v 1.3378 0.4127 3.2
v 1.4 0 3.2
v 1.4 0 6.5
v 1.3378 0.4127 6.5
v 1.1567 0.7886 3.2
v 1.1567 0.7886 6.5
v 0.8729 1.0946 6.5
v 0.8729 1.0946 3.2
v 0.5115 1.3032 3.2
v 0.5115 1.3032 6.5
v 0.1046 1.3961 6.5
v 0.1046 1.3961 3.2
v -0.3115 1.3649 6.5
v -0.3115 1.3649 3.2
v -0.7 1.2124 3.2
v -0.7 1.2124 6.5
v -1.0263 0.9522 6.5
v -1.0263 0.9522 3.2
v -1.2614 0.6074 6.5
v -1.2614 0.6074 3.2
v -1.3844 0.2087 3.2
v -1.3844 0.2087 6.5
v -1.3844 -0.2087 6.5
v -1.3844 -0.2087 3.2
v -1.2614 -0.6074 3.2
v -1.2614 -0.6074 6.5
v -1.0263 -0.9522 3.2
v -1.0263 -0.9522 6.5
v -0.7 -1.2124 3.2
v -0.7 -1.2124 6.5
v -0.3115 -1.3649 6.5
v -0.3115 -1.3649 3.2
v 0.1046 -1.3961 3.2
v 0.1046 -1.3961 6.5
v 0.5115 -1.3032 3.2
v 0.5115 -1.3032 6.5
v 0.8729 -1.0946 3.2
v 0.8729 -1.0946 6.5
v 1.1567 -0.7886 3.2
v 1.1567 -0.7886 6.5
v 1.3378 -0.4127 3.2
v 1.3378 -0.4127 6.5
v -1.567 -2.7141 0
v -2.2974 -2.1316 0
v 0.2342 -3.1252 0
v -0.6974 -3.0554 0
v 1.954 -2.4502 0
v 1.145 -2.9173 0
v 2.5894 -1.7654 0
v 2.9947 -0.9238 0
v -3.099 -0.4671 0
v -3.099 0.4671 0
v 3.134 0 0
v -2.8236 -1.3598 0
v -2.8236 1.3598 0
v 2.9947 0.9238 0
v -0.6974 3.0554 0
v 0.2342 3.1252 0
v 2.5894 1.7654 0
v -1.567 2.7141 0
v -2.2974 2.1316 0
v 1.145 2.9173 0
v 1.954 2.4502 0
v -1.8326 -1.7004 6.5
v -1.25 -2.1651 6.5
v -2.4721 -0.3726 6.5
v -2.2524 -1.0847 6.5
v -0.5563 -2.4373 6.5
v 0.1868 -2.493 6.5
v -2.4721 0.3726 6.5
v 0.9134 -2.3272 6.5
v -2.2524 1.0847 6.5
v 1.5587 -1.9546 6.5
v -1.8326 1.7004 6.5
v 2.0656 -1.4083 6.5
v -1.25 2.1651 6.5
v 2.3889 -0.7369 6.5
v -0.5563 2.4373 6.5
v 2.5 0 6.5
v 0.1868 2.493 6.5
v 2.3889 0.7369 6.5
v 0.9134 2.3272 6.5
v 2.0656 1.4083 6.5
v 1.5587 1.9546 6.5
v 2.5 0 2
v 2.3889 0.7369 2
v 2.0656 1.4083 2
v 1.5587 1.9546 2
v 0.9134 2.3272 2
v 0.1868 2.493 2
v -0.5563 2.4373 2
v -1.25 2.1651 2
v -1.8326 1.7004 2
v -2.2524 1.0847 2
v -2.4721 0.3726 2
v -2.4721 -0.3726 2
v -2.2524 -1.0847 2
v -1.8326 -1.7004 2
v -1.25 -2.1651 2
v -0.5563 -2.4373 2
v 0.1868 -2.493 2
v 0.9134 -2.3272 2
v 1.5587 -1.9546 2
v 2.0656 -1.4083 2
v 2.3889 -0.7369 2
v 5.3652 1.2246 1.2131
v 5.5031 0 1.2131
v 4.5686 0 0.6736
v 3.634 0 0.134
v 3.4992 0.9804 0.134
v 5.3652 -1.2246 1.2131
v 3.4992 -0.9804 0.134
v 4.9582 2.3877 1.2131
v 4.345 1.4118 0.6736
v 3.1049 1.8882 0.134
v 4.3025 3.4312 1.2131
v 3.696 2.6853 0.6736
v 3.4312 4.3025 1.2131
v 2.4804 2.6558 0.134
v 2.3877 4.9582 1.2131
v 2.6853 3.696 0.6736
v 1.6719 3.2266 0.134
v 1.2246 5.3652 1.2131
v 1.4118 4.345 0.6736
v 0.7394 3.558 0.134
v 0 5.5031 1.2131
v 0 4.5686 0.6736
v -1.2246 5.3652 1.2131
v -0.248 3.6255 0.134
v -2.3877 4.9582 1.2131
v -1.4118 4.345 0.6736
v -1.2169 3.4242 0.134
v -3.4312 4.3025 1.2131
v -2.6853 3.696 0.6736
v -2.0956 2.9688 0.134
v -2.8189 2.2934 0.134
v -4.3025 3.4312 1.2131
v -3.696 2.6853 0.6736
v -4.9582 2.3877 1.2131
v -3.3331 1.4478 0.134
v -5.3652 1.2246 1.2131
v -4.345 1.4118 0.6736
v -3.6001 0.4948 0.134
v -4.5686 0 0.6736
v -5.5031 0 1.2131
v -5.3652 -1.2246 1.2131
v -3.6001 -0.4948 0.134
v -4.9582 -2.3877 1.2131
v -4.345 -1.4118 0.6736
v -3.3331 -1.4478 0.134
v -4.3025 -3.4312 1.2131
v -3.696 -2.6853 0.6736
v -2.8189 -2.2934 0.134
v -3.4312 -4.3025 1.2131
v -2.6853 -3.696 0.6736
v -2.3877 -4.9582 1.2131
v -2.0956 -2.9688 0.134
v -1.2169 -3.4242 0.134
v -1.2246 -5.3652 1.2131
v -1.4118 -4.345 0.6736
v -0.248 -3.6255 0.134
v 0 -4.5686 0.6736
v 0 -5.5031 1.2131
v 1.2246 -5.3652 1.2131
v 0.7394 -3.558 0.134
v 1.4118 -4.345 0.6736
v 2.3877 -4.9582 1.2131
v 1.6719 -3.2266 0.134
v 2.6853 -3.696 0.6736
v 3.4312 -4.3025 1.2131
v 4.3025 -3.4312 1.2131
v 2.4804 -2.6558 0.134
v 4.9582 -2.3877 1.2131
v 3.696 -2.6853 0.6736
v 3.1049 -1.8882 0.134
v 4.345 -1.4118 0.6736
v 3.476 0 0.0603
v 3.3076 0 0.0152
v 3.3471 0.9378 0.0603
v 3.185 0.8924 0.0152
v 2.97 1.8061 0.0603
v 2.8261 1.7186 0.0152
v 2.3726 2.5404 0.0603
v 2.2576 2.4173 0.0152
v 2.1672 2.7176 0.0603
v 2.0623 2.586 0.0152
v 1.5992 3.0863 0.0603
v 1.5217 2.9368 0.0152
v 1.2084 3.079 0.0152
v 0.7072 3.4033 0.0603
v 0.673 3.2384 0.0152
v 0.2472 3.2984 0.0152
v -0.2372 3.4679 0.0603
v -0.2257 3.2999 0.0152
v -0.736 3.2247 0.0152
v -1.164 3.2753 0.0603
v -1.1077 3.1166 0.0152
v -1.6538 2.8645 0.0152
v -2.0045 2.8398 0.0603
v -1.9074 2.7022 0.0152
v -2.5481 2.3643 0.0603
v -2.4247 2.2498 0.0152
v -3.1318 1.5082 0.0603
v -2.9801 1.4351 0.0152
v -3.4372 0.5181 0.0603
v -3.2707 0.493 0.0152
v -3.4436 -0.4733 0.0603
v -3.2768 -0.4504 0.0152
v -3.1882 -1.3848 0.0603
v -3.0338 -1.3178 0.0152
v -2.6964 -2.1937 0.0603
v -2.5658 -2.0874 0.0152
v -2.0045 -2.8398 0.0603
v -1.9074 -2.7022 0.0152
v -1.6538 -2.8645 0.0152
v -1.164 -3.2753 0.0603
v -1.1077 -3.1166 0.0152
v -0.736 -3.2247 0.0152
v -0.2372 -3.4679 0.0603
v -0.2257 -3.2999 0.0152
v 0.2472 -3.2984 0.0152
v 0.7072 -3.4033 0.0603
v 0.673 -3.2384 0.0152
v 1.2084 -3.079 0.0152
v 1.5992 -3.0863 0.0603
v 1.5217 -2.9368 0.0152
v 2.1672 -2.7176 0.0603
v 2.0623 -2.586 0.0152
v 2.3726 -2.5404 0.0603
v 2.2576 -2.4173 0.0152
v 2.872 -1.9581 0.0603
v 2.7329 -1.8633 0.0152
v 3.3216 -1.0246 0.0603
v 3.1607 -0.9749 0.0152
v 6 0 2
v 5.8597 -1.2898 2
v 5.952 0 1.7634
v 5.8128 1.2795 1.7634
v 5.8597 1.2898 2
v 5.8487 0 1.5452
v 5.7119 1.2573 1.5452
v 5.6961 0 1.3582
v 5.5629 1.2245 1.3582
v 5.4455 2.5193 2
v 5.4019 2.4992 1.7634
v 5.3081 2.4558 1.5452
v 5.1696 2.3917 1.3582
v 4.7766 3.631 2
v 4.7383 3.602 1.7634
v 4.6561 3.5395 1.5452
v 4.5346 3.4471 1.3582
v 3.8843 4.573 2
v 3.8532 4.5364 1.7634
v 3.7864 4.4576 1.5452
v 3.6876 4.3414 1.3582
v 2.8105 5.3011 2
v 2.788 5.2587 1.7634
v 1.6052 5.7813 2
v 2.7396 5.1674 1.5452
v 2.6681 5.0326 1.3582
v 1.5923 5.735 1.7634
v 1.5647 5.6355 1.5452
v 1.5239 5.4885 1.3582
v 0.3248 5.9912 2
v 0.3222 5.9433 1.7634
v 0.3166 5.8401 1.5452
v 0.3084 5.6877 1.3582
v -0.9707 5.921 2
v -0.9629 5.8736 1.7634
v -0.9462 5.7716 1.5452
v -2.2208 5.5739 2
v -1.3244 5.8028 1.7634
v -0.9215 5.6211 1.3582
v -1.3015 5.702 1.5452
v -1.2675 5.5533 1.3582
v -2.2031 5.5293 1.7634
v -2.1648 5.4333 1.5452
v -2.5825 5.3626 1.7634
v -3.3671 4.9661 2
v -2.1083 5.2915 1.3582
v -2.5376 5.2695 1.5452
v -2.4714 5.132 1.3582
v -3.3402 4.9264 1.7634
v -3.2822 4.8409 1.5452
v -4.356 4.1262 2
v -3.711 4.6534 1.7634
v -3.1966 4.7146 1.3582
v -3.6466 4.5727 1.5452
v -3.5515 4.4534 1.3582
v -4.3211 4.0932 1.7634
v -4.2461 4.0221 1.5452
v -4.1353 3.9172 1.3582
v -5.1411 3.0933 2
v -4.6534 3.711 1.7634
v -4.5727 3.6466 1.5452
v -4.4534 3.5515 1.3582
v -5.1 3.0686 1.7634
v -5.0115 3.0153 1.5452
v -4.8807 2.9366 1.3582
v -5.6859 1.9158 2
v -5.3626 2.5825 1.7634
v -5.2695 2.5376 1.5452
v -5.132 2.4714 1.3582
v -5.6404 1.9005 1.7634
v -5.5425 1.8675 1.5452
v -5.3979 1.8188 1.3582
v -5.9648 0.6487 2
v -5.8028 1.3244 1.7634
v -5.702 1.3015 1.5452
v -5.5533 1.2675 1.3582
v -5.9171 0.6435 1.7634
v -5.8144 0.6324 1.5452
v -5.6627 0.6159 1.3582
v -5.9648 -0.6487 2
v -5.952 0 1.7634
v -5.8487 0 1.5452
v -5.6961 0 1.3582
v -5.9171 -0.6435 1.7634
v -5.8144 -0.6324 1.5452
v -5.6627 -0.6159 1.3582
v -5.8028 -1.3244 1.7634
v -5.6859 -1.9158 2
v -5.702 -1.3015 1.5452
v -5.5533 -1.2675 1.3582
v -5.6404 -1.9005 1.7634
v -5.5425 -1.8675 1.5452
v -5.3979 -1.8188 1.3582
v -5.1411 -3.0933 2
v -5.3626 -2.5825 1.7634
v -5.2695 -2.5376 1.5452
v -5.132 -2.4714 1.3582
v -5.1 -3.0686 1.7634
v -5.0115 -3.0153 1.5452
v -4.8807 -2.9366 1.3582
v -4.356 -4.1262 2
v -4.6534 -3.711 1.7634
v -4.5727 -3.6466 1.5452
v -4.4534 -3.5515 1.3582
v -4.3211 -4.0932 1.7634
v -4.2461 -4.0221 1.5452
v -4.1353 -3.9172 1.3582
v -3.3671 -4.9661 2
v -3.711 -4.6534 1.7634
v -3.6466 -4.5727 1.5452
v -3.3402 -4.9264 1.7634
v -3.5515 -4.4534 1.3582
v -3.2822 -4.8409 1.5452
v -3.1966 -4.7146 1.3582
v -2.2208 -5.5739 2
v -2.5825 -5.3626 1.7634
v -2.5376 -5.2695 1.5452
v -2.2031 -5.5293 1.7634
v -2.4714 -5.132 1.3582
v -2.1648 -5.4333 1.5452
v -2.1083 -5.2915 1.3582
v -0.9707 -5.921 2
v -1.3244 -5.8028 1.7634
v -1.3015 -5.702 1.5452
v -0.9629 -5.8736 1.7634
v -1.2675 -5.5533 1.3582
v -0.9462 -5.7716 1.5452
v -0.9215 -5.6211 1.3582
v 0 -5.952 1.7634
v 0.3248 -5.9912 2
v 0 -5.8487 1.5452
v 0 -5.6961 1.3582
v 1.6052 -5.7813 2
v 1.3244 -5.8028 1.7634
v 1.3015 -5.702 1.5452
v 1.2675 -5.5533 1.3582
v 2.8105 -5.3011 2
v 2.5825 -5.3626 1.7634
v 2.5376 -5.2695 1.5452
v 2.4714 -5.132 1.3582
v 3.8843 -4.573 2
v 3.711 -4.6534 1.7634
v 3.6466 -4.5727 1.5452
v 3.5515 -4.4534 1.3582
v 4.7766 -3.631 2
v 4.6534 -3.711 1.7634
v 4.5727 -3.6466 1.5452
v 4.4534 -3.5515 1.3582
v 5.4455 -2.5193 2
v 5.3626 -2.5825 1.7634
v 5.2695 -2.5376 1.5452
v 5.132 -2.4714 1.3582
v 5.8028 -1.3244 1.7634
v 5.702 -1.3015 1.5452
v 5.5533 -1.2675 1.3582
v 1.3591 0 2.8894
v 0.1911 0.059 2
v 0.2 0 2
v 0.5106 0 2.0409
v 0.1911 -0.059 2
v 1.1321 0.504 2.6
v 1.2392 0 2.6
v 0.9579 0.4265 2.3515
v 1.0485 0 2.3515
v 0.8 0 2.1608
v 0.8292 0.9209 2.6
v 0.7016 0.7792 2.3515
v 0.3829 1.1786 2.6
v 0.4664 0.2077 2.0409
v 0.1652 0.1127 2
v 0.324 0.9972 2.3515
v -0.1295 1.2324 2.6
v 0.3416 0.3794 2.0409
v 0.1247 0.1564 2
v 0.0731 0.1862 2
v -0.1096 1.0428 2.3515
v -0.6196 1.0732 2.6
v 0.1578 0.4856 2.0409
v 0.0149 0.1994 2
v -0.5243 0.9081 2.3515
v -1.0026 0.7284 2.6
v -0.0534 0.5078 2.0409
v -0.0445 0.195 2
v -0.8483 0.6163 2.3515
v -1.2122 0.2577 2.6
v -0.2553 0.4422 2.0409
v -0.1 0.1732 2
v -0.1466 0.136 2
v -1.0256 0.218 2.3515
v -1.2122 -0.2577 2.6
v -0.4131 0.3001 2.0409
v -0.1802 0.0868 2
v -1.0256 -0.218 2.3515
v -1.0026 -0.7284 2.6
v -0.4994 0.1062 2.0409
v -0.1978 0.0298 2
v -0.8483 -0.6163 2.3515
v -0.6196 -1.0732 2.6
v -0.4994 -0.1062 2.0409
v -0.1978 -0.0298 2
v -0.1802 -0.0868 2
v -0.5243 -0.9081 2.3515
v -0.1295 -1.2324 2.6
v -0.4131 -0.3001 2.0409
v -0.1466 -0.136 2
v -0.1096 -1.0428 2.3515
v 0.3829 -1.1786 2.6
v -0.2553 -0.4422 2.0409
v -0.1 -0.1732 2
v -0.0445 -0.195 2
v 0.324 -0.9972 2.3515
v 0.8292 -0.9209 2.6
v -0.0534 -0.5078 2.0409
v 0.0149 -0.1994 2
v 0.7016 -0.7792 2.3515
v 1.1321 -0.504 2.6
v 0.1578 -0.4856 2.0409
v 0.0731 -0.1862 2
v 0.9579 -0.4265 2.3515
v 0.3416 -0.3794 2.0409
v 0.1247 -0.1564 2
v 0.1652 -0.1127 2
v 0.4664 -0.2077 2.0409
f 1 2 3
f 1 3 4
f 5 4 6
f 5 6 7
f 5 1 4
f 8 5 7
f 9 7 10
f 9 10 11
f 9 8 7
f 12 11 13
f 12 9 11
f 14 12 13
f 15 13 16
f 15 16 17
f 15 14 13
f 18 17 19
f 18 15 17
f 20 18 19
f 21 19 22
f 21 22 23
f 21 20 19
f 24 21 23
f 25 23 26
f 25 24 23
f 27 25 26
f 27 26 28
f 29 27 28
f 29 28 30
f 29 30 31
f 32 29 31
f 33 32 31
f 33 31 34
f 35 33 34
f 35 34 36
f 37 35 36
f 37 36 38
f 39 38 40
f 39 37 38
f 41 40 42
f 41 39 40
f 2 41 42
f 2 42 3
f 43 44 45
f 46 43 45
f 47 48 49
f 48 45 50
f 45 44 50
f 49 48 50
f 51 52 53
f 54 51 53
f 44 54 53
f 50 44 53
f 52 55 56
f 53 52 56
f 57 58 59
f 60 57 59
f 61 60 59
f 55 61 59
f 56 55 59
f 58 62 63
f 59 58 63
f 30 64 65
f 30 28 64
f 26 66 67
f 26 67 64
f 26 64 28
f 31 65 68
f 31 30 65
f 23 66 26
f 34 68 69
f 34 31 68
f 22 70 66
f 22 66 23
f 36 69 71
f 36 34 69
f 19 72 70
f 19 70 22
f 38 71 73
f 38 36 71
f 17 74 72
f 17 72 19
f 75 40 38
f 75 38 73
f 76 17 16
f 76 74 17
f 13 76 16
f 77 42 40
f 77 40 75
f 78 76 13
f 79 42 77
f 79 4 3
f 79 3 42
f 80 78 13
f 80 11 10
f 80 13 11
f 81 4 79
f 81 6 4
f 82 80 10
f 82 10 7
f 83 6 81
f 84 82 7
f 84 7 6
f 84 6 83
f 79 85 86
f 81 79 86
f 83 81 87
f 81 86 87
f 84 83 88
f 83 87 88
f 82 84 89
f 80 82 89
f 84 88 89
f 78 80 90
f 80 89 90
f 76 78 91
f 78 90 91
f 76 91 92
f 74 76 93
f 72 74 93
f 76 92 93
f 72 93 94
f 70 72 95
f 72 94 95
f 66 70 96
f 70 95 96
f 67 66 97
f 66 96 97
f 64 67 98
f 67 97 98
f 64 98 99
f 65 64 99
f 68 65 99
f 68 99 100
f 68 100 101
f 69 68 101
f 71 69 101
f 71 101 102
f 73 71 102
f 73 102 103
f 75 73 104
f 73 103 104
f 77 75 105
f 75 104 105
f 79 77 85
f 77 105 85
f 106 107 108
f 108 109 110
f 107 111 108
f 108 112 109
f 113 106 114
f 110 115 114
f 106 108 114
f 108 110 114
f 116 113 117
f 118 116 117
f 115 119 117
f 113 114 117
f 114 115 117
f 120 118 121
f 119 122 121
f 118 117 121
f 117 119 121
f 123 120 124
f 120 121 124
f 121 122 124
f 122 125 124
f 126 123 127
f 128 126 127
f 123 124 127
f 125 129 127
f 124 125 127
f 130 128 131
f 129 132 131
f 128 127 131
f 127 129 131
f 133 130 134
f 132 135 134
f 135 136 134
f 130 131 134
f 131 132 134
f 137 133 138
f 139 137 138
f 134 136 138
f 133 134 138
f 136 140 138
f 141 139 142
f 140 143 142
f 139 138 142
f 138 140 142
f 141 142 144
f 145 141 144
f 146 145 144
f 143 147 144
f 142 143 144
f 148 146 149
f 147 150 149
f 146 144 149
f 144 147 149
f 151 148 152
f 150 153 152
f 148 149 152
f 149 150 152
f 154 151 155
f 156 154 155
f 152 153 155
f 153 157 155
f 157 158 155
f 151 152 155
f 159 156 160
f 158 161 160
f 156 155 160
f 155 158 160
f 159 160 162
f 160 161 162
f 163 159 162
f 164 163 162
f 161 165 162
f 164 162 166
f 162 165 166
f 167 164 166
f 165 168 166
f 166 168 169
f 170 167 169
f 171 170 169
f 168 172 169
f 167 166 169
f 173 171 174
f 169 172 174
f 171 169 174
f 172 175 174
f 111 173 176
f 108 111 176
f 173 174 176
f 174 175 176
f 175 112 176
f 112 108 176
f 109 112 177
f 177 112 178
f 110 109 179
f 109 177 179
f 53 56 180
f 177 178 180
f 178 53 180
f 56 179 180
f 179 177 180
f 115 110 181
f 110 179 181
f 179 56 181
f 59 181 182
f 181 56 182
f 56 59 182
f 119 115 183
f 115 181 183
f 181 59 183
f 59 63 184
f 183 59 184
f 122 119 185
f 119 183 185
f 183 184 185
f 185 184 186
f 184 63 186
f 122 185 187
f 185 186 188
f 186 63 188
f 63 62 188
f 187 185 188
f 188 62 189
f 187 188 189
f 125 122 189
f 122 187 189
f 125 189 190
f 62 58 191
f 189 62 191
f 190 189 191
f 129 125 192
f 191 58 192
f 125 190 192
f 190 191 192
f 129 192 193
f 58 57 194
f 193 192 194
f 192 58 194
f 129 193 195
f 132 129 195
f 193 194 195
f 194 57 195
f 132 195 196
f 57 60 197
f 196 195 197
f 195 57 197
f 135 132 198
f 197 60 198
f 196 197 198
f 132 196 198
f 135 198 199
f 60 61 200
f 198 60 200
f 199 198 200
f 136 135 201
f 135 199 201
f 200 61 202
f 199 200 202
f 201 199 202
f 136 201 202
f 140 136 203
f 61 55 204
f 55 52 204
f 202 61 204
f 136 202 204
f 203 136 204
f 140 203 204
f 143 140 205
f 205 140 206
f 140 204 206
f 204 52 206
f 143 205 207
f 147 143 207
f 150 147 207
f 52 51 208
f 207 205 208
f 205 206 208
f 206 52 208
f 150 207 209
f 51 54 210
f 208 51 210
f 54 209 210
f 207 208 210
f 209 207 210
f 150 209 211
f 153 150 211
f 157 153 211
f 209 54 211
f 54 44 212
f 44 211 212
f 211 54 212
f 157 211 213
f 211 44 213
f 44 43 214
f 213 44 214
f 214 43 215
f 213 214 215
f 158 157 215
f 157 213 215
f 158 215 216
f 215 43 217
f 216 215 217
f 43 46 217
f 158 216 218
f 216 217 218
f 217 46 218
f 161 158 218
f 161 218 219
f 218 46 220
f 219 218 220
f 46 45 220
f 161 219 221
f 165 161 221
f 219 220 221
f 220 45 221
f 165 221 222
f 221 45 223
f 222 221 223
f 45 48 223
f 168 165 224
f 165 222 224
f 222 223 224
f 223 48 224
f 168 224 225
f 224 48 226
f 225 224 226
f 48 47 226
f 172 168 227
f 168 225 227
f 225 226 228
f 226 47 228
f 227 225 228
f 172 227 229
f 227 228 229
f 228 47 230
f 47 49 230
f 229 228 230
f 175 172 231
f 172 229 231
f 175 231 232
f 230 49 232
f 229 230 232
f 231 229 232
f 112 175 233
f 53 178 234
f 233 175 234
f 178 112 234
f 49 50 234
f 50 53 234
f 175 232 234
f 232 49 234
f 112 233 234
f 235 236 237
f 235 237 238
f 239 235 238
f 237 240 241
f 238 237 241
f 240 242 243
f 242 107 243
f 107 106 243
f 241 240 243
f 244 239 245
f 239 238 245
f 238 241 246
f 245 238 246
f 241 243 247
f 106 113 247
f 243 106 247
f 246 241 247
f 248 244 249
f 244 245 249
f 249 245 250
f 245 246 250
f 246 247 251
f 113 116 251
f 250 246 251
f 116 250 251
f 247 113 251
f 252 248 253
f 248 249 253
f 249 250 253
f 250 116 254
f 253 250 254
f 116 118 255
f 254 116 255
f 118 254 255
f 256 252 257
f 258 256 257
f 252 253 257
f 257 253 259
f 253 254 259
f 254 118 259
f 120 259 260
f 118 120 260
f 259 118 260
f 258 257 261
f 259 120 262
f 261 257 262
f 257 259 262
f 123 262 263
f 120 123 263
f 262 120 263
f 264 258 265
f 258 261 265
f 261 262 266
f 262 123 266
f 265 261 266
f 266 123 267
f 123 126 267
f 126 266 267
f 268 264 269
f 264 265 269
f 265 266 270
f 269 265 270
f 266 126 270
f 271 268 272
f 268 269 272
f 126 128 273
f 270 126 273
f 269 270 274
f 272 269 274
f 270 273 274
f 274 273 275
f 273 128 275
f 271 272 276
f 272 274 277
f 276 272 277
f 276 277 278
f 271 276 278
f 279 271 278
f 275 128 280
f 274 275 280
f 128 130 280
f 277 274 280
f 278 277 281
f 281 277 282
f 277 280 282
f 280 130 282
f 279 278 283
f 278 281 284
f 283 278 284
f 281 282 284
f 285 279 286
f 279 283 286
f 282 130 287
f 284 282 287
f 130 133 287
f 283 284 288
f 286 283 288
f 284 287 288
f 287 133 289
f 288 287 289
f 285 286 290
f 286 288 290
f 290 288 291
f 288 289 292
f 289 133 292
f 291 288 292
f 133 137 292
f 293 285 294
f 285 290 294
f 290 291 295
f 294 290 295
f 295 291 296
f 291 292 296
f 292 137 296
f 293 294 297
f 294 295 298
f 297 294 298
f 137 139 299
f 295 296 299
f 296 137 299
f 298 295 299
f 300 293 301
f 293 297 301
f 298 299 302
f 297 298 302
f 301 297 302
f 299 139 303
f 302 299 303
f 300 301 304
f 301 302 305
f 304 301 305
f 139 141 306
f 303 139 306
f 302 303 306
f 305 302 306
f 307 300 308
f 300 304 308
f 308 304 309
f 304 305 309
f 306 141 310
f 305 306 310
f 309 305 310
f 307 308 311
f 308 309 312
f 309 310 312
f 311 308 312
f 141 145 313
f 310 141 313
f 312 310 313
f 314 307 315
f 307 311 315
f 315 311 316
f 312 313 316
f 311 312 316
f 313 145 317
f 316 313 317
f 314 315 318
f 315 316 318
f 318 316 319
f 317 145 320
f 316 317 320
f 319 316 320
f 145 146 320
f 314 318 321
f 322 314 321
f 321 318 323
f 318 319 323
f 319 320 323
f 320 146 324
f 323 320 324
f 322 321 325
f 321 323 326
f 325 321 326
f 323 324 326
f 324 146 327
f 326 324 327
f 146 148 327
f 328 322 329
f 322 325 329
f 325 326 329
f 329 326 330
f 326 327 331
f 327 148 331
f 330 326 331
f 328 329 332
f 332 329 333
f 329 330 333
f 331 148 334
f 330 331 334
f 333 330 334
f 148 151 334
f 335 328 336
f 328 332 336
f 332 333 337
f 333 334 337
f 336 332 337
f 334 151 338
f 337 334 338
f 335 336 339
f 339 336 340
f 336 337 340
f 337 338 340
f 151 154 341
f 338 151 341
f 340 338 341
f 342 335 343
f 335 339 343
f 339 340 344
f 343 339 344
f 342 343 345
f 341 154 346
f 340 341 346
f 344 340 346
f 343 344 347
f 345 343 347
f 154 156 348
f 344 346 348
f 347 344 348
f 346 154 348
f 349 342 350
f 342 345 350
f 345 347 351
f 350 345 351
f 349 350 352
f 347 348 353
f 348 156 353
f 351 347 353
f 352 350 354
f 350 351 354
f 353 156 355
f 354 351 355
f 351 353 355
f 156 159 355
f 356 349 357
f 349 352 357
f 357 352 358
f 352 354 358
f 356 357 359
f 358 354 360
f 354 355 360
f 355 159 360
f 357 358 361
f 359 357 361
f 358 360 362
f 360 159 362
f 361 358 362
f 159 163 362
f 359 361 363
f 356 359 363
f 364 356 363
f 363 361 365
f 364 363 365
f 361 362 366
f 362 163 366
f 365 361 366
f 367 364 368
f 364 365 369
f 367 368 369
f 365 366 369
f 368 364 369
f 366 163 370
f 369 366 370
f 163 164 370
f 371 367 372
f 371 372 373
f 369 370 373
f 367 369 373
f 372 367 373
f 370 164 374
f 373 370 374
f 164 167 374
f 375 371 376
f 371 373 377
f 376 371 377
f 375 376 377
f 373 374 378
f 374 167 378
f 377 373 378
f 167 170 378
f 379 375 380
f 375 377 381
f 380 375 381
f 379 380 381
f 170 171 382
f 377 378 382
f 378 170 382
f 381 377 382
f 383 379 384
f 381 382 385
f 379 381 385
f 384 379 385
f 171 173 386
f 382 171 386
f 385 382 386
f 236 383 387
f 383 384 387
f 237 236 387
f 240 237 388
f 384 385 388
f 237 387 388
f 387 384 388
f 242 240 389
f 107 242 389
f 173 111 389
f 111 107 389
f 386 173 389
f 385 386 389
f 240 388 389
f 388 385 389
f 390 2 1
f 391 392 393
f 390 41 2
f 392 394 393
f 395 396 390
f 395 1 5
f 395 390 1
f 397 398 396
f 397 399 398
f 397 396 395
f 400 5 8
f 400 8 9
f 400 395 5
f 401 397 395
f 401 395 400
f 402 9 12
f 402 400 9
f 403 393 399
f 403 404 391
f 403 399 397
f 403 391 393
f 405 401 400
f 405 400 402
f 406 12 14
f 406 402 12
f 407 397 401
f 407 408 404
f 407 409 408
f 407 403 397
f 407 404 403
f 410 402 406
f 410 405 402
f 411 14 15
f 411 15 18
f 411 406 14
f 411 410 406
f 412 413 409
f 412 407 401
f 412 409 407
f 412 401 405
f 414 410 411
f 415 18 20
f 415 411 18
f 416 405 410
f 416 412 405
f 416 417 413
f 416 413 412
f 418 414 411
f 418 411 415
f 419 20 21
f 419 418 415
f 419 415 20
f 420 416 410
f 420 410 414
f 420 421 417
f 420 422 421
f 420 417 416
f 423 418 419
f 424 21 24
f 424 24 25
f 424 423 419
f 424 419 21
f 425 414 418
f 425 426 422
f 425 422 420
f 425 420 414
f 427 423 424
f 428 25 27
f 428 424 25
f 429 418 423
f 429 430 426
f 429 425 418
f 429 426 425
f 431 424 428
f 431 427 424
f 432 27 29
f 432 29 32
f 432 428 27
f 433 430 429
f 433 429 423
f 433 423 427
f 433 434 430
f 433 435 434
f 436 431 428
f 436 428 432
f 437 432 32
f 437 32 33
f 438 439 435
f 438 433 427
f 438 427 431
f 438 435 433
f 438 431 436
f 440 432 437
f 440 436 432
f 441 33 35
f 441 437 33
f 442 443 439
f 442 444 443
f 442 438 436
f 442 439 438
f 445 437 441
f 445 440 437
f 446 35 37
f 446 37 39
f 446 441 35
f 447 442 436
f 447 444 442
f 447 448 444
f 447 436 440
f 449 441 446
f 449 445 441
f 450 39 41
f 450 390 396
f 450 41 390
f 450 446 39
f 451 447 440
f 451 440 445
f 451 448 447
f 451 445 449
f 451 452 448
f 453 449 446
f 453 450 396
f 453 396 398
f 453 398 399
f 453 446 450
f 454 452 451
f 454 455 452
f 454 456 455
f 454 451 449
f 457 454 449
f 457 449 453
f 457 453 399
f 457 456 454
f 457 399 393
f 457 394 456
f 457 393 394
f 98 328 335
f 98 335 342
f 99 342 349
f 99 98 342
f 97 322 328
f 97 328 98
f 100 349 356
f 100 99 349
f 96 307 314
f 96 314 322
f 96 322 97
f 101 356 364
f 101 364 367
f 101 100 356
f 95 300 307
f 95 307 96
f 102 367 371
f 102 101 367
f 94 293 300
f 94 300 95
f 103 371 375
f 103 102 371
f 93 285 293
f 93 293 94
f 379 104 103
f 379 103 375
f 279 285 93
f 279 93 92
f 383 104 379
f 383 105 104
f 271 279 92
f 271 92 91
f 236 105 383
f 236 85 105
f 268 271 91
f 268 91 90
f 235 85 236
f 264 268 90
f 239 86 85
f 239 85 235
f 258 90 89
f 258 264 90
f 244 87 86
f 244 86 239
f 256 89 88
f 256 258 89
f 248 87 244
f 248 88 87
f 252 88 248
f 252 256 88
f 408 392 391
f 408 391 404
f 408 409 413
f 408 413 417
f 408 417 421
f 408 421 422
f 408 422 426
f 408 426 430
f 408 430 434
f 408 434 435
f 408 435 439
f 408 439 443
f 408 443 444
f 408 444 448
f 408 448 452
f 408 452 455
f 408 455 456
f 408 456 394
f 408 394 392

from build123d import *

# Parameters (mm, degrees)
F0_R     = 6
F1_DEPTH = 2
F2_SIZE2 = 2.5980762114
F2_SIZE  = 1.5
F4_R     = 2.5
F4_R_2   = 1.4
F5_DEPTH = 4.5
F6_R     = 1.2


# Not quite as in the source:
# - a fillet or chamfer that OpenCascade refuses, or shapes differently, is made with other operations: its cross-section is extruded or revolved along the edge and cut away or added


with BuildPart() as f1:
    # F0 (on Top) → F1 (new body)
    with BuildSketch(Plane.XY):
        Circle(F0_R)
    extrude(amount=F1_DEPTH)

    # F2
    f2_edges = [f1.edges().sort_by_distance(p)[0] for p in [
        (-6, 0, 0),
    ]]
    f2_side = f1.faces().sort_by_distance((-6, 0, 1))[0]
    chamfer(f2_edges, length=F2_SIZE, length2=F2_SIZE2, reference=f2_side)

    # F3: fillet of radius 1 on 2 edges, made by hand

    # F3_s1 → F3_t2 (revolve, cut)
    with BuildSketch(Plane.XZ):
        with BuildLine():
            ThreePointArc((3.6339745962, 0.1339745962), (3.3927936413, 0.0340741737), (3.1339745962, 0))
            Line((3.1339745962, 0), (3.4019237886, 0))
            Line((3.4019237886, 0), (3.6339745962, 0.1339745962))
        make_face()
    revolve(axis=Axis((0, 0, 0), (0, 0, 1)), mode=Mode.SUBTRACT)

    # F3_s3 → F3_t4 (revolve, cut)
    with BuildSketch(Plane.XZ):
        with BuildLine():
            ThreePointArc((6, 2), (5.8486778537, 1.5452494356), (5.5031382462, 1.2131367327))
            Line((5.5031382462, 1.2131367327), (6, 1.5))
            Line((6, 1.5), (6, 2))
        make_face()
    revolve(axis=Axis((0, 0, 1.5), (0, 0, 1)), mode=Mode.SUBTRACT)

    # F4 (on face) → F5 (join)
    with BuildSketch(Plane.XY.offset(2)):
        Circle(F4_R)
        Circle(F4_R_2, mode=Mode.SUBTRACT)
    extrude(amount=F5_DEPTH)

    # F6
    f6_edges = [f1.edges().sort_by_distance(p)[0] for p in [
        (-1.4, 0, 2),
    ]]
    fillet(f6_edges, radius=F6_R)


solid = f1.part
